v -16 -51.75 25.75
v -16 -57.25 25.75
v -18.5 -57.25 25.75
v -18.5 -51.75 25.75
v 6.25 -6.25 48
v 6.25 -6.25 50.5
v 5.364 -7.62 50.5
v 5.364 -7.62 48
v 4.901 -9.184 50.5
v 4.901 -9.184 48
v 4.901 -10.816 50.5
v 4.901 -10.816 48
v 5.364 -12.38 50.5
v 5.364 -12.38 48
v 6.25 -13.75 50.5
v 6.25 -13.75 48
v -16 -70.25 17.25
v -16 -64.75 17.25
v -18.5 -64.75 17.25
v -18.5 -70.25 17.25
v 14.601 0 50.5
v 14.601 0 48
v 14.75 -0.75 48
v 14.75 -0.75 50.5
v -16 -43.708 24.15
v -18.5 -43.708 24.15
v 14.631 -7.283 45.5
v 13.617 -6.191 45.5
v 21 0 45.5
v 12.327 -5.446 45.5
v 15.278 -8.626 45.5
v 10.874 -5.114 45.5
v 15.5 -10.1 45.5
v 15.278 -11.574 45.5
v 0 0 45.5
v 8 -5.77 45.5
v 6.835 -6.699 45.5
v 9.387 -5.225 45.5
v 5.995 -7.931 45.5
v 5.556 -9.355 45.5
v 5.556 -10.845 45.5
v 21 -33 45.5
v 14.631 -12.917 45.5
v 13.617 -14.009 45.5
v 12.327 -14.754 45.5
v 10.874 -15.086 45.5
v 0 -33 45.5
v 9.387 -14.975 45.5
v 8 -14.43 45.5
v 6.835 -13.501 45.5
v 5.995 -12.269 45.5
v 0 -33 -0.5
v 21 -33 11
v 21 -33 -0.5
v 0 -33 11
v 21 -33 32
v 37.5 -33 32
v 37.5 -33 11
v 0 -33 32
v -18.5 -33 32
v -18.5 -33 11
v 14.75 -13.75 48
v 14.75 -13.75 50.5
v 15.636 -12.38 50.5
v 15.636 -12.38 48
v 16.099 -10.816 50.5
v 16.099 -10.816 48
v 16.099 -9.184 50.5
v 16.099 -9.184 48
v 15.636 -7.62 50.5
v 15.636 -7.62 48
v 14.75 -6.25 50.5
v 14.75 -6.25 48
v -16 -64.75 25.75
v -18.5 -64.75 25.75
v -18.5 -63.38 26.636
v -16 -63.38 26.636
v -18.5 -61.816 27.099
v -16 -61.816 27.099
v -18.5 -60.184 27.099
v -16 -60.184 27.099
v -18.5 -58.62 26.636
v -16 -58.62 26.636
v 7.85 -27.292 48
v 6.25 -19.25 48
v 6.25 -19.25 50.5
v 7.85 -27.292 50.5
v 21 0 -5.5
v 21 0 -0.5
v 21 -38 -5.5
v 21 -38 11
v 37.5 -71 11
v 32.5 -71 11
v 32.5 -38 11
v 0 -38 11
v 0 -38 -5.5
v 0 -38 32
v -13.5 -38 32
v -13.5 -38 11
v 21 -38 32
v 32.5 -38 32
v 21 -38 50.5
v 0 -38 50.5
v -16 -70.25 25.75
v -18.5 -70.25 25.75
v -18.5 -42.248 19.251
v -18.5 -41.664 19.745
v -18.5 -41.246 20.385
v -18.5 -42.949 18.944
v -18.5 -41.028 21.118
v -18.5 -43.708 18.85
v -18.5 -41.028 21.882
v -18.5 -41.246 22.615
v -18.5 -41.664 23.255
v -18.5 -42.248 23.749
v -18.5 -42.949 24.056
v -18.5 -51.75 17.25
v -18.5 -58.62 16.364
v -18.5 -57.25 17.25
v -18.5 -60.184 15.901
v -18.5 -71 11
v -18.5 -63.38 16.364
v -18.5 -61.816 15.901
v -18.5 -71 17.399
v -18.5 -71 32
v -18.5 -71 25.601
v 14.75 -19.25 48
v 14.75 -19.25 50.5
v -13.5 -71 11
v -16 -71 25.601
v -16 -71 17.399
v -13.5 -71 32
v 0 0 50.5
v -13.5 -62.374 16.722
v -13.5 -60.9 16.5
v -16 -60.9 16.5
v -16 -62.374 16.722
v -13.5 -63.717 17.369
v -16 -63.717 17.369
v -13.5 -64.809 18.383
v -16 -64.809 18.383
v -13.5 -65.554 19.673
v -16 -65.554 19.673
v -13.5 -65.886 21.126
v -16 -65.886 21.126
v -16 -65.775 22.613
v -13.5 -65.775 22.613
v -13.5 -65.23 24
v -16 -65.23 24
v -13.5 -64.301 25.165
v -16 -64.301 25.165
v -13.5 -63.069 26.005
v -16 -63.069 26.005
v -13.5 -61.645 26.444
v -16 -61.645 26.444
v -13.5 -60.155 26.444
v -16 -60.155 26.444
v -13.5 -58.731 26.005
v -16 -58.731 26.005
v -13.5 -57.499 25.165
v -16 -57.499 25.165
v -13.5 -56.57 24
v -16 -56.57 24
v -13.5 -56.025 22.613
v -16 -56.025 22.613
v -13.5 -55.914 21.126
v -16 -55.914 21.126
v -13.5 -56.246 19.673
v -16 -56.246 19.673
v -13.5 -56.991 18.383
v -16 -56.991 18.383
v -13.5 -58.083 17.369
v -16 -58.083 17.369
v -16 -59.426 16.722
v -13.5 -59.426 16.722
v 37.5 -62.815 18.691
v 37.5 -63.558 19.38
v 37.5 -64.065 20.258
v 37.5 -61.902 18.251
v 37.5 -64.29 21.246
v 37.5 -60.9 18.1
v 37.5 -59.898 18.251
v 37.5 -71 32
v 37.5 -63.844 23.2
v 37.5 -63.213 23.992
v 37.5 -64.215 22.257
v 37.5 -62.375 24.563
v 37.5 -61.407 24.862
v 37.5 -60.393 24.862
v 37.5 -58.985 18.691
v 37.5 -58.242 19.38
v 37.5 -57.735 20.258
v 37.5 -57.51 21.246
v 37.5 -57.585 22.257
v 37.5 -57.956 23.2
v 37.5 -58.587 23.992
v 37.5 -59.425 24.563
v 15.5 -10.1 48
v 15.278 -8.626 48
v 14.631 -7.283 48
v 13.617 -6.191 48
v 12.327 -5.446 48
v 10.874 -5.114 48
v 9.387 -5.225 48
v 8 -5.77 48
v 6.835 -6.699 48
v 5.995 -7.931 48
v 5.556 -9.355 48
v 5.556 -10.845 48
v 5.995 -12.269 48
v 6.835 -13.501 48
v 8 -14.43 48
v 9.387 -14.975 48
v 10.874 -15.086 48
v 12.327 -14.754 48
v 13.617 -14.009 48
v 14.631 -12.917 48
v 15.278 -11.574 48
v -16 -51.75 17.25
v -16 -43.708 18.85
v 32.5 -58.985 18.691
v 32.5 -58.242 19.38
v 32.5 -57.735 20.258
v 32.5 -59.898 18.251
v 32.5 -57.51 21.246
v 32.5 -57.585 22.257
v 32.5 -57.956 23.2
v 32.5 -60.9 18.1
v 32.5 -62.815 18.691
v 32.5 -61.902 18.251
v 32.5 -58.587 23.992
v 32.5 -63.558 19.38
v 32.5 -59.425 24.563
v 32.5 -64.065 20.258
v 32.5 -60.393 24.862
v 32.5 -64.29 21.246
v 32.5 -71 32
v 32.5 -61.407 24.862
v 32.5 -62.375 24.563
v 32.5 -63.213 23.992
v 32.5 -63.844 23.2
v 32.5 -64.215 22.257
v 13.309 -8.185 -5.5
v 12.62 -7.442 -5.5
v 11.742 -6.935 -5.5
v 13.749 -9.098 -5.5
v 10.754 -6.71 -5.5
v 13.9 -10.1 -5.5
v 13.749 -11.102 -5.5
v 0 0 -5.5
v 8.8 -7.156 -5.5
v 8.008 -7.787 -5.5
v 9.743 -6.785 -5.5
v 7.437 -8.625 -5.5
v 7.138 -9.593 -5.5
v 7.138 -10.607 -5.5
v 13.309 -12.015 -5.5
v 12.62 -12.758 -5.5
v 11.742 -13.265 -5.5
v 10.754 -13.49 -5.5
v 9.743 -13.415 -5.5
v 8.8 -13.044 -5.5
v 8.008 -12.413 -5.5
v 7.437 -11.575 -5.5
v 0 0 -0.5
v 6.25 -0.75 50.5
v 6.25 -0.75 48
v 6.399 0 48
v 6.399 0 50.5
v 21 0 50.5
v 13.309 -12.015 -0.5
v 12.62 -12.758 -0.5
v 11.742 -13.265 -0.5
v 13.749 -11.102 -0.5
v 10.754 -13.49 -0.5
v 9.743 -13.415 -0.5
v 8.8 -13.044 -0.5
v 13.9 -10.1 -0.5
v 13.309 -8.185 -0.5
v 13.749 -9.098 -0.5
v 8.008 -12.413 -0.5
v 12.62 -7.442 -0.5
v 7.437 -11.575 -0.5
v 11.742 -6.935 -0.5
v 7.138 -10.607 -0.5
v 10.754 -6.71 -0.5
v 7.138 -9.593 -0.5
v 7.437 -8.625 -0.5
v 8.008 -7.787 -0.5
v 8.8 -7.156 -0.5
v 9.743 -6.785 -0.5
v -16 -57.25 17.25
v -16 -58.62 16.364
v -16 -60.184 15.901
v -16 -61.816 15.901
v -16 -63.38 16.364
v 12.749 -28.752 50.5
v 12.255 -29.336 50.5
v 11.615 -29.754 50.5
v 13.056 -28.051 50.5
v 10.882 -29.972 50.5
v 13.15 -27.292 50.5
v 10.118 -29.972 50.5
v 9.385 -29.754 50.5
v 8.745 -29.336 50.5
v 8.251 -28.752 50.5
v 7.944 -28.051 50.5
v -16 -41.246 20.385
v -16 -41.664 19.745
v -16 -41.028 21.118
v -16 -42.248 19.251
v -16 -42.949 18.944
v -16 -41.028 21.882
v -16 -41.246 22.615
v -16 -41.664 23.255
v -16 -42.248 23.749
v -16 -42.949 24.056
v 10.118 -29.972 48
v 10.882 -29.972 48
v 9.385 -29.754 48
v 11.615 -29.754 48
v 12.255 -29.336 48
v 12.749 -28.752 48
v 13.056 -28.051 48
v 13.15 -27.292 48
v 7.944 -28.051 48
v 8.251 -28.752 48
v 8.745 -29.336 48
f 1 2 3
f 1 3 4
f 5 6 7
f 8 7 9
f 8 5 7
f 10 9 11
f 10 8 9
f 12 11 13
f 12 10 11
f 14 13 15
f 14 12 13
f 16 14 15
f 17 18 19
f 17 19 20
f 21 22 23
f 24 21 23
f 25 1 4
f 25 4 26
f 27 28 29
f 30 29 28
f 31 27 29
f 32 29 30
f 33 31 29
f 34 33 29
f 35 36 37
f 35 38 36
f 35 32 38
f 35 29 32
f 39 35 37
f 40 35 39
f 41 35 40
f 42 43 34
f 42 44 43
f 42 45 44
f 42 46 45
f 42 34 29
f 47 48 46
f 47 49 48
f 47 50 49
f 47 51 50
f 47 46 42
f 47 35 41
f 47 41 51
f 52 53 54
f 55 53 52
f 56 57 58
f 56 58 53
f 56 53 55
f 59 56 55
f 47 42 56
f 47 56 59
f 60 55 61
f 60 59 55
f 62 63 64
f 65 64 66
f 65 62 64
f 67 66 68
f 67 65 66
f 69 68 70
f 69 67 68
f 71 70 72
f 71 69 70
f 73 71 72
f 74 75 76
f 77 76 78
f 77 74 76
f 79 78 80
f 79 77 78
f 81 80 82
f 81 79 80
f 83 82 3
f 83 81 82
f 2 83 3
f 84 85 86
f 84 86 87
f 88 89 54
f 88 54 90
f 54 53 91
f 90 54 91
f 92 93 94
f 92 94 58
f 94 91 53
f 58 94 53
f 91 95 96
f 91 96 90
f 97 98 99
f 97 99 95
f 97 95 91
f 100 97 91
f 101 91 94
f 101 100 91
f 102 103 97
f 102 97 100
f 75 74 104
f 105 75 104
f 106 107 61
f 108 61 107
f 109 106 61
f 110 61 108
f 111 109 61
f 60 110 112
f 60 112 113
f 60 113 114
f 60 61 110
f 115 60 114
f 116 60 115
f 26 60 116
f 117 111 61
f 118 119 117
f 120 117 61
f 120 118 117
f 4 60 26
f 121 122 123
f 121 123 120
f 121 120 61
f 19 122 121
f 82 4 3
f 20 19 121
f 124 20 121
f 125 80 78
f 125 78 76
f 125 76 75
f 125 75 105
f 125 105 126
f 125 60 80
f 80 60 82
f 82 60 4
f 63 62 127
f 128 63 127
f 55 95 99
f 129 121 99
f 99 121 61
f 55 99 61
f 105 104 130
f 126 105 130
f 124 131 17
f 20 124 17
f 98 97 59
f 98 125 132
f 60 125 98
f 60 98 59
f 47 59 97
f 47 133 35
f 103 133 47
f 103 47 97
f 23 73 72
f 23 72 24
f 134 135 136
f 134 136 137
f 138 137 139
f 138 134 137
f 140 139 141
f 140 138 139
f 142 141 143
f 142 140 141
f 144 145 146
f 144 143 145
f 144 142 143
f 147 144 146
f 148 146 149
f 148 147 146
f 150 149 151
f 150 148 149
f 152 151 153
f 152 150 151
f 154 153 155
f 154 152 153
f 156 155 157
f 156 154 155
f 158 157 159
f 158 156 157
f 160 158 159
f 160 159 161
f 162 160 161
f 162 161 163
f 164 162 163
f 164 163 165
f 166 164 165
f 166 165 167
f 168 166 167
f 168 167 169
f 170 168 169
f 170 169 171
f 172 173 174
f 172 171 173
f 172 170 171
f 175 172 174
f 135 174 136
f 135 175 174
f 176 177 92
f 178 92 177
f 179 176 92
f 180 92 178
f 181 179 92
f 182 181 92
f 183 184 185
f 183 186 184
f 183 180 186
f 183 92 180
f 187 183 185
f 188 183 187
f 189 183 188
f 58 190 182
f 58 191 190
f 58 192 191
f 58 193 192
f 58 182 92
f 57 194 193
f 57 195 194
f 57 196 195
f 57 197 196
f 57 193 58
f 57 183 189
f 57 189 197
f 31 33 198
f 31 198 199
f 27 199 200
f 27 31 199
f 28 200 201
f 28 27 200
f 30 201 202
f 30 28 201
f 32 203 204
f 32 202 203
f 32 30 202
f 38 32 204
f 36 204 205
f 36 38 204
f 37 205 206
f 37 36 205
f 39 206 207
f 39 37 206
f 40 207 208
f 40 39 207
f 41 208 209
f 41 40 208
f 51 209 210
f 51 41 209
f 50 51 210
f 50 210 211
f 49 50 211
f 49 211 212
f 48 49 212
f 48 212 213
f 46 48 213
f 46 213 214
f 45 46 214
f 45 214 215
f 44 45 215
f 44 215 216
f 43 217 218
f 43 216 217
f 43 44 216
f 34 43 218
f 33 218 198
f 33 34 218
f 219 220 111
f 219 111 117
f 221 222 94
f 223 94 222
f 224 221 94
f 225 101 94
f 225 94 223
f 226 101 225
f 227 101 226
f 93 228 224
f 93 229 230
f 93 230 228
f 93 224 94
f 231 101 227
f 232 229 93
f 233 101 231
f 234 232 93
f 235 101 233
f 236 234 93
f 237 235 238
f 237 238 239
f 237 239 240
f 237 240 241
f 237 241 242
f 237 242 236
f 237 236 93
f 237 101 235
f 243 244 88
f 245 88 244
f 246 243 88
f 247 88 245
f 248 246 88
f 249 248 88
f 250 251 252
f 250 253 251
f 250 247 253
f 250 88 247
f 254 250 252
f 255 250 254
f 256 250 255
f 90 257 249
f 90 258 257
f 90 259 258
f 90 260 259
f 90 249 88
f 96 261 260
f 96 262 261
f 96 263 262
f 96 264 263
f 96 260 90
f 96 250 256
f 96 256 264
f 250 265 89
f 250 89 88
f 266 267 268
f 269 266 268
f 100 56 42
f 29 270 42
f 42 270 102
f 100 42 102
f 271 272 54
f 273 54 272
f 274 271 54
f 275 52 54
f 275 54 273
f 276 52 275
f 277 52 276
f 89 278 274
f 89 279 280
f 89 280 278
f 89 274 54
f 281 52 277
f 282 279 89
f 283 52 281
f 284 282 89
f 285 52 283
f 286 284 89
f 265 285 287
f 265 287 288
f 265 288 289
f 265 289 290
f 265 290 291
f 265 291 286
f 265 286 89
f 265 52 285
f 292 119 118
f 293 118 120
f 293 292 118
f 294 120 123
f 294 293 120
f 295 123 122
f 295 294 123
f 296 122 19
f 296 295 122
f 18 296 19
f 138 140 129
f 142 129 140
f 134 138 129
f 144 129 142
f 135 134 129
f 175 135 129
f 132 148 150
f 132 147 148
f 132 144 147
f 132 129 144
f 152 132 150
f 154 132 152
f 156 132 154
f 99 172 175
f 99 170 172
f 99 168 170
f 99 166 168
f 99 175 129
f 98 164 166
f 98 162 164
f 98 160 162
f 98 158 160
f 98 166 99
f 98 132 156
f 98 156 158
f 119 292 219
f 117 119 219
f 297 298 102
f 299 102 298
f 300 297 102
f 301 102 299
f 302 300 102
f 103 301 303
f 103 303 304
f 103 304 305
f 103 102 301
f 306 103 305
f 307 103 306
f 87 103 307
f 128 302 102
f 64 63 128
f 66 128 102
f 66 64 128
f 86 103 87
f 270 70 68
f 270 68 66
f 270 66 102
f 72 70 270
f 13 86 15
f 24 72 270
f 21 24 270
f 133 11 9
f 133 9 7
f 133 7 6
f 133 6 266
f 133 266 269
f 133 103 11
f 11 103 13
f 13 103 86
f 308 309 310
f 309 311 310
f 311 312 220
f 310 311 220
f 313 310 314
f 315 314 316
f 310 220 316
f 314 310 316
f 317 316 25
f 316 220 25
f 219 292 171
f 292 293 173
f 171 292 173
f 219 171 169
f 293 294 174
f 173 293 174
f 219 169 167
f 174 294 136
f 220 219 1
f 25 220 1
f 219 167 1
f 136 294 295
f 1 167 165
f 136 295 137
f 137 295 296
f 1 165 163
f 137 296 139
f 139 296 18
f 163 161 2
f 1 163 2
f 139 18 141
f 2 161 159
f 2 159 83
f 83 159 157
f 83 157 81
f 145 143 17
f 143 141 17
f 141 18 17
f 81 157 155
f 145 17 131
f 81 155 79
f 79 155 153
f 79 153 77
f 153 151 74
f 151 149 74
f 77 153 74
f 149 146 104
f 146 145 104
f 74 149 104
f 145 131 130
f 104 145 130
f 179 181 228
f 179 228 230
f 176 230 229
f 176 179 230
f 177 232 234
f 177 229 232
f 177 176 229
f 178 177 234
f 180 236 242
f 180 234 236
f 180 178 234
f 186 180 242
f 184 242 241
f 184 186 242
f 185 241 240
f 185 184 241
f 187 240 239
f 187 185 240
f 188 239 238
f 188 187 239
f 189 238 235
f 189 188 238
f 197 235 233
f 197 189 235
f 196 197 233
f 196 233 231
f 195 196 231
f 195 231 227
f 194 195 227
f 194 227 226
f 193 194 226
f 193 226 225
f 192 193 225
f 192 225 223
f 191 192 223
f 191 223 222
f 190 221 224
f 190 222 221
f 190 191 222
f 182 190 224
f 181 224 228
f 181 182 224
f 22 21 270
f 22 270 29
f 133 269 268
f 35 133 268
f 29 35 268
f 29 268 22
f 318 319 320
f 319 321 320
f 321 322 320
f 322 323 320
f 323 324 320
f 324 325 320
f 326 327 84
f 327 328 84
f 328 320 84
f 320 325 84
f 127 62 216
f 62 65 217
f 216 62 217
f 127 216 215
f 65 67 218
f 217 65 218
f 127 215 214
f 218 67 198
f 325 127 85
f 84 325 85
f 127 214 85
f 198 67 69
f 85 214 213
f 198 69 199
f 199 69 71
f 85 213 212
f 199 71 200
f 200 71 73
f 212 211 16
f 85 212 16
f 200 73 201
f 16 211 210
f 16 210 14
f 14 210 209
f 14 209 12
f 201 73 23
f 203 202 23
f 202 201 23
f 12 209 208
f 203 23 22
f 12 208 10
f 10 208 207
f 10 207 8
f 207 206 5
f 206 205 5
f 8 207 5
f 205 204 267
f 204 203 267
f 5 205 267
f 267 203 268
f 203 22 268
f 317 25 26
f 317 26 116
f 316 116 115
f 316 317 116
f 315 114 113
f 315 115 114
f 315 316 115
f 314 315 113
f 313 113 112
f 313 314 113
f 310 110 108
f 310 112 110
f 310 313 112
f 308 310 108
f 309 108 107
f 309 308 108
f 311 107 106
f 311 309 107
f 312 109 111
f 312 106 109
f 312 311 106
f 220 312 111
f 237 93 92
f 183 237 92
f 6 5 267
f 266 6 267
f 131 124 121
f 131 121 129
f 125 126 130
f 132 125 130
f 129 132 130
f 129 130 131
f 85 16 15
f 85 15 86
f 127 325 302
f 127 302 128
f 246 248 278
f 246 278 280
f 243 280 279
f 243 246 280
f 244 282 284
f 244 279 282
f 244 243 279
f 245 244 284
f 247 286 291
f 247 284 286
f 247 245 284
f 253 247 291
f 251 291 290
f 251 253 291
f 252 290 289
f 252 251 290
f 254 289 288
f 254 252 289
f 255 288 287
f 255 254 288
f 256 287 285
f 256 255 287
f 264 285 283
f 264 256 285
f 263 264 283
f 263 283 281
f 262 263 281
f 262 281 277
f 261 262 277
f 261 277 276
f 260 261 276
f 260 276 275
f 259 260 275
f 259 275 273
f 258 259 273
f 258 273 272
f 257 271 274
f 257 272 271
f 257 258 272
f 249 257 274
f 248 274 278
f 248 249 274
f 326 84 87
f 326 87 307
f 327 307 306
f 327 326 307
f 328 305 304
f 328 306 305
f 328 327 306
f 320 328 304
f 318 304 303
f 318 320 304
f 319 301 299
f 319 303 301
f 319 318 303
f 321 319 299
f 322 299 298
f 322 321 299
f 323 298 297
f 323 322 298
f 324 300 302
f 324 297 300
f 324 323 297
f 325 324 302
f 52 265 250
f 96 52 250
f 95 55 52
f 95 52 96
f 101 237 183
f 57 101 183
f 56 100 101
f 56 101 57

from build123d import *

# Parameters (mm, degrees)
CYLINDER039_R          = 3.4
CYLINDER039_DEPTH      = 44
CYLINDER038_R          = 5
CYLINDER038_DEPTH      = 9
PAD015_DEPTH           = 5
PAD014_DEPTH           = 21
CUT021_PITCH_ANGLE     = 90
CUT021_PLACEMENT_ANGLE = -180
CYLINDER037_R          = 3.4
CYLINDER037_DEPTH      = 44
CYLINDER036_R          = 5
CYLINDER036_DEPTH      = 9
PAD013_DEPTH           = 5
PAD012_DEPTH           = 21


with BuildPart() as cylinder039:
    # Cylinder039 → Cylinder039 (new body)
    with BuildSketch(Plane(origin=(10.5, -10.1, -9), x_dir=(1, 0, 0), z_dir=(0, 0, 1))):
        Circle(CYLINDER039_R)
    extrude(amount=CYLINDER039_DEPTH)


with BuildPart() as cylinder038:
    # Cylinder038 → Cylinder038 (new body)
    with BuildSketch(Plane(origin=(10.5, -10.1, 44), x_dir=(1, 0, 0), z_dir=(0, 0, 1))):
        Circle(CYLINDER038_R)
    extrude(amount=CYLINDER038_DEPTH)


with BuildPart() as fusion031:
    # Sketch015 → Pad015 (new body)
    with BuildSketch(Plane.XY):
        with BuildLine():
            Line((-4.25, 3.75), (-4.25, 9.25))
            Line((-4.25, 9.25), (-2.65, 17.292388))
            ThreePointArc((2.65, 17.292388), (0, 20), (-2.65, 17.292388))
            Line((2.65, 17.292388), (4.25, 9.25))
            Line((4.25, 3.75), (4.25, 9.25))
            ThreePointArc((4.25, -3.75), (5.657274, 0), (4.25, 3.75))
            Line((4.25, -3.75), (4.25, -9.25))
            Line((2.65, -17.292388), (4.25, -9.25))
            ThreePointArc((-2.65, -17.292388), (0, -20), (2.65, -17.292388))
            Line((-4.25, -9.25), (-2.65, -17.292388))
            Line((-4.25, -3.75), (-4.25, -9.25))
            ThreePointArc((-4.25, 3.75), (-5.657274, 0), (-4.25, -3.75))
        make_face()
    extrude(amount=PAD015_DEPTH)


with BuildPart() as fusion031_1:
    # Body015 placement: moved
    add(fusion031.part.moved(Location((10.5, -10, 48))))

    # Fusion031: union Cylinder038
    add(cylinder038.part)


with BuildPart() as agarre003:
    # Sketch014 → Pad014 (new body)
    with BuildSketch(Plane.YZ):
        Polygon((-33, -0.5), (0, -0.5), (0, -5.5), (-38, -5.5), (-38, 50.5), (0, 50.5), (0, 45.5), (-33, 45.5), align=None)
    extrude(amount=PAD014_DEPTH)

    # Cut020: cut Fusion031
    add(fusion031_1.part, mode=Mode.SUBTRACT)

    # Cut021: cut Cylinder039
    add(cylinder039.part, mode=Mode.SUBTRACT)


with BuildPart() as agarre003_1:
    # Cut021 pitch: moved
    add(agarre003.part.rotate(Axis((0, 0, 0), (0, 1, 0)), CUT021_PITCH_ANGLE))


with BuildPart() as agarre003_2:
    # Cut021 placement: moved
    add(agarre003_1.part.moved(Location((32, -71, 32))).rotate(Axis((32, -71, 32), (0, 0, 1)), CUT021_PLACEMENT_ANGLE))


with BuildPart() as cylinder037:
    # Cylinder037 → Cylinder037 (new body)
    with BuildSketch(Plane(origin=(10.5, -10.1, -9), x_dir=(1, 0, 0), z_dir=(0, 0, 1))):
        Circle(CYLINDER037_R)
    extrude(amount=CYLINDER037_DEPTH)


with BuildPart() as cylinder036:
    # Cylinder036 → Cylinder036 (new body)
    with BuildSketch(Plane(origin=(10.5, -10.1, 44), x_dir=(1, 0, 0), z_dir=(0, 0, 1))):
        Circle(CYLINDER036_R)
    extrude(amount=CYLINDER036_DEPTH)


with BuildPart() as fusion030:
    # Sketch013 → Pad013 (new body)
    with BuildSketch(Plane.XY):
        with BuildLine():
            Line((-4.25, 3.75), (-4.25, 9.25))
            Line((-4.25, 9.25), (-2.65, 17.292388))
            ThreePointArc((2.65, 17.292388), (0, 20), (-2.65, 17.292388))
            Line((2.65, 17.292388), (4.25, 9.25))
            Line((4.25, 3.75), (4.25, 9.25))
            ThreePointArc((4.25, -3.75), (5.657274, 0), (4.25, 3.75))
            Line((4.25, -3.75), (4.25, -9.25))
            Line((2.65, -17.292388), (4.25, -9.25))
            ThreePointArc((-2.65, -17.292388), (0, -20), (2.65, -17.292388))
            Line((-4.25, -9.25), (-2.65, -17.292388))
            Line((-4.25, -3.75), (-4.25, -9.25))
            ThreePointArc((-4.25, 3.75), (-5.657274, 0), (-4.25, -3.75))
        make_face()
    extrude(amount=PAD013_DEPTH)


with BuildPart() as fusion030_1:
    # Body013 placement: moved
    add(fusion030.part.moved(Location((10.5, -10, 48))))

    # Fusion030: union Cylinder036
    add(cylinder036.part)


with BuildPart() as cadera:
    # Sketch012 → Pad012 (new body)
    with BuildSketch(Plane.YZ):
        Polygon((-33, -0.5), (0, -0.5), (0, -5.5), (-38, -5.5), (-38, 50.5), (0, 50.5), (0, 45.5), (-33, 45.5), align=None)
    extrude(amount=PAD012_DEPTH)

    # Cut018: cut Fusion030
    add(fusion030_1.part, mode=Mode.SUBTRACT)

    # Cut019: cut Cylinder037
    add(cylinder037.part, mode=Mode.SUBTRACT)

    # Fusion032: union Agarre003
    add(agarre003_2.part)


solid = cadera.part
